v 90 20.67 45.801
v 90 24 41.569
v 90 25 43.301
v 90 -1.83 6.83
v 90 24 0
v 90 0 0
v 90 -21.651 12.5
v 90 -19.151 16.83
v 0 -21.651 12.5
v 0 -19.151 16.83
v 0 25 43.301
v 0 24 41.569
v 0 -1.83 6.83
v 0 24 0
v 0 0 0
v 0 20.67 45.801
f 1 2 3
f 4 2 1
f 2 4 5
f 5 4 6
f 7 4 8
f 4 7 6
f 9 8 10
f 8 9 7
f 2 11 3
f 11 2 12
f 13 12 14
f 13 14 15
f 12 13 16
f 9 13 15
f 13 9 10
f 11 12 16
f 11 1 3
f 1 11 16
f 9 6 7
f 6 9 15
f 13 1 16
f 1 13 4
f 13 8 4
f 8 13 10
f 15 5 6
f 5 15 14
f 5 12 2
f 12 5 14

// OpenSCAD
module triangle(l, w, h){
      polyhedron(//pt 0        1        2        3        4        5
              points=[[0,0,0], [l,0,0], [l,w,0], [0,w,0], [0,w,h], [l,w,h]],
              faces=[[0,1,2,3],[5,4,3,2],[0,4,5,1],[0,3,4],[5,2,1]]
              );
            }

rotate([60,0,0]) difference()
{
  cube([90,50,25]);
  translate([-2,5,5]) cube([95,60,30]);
}

triangle(90,24,42);
